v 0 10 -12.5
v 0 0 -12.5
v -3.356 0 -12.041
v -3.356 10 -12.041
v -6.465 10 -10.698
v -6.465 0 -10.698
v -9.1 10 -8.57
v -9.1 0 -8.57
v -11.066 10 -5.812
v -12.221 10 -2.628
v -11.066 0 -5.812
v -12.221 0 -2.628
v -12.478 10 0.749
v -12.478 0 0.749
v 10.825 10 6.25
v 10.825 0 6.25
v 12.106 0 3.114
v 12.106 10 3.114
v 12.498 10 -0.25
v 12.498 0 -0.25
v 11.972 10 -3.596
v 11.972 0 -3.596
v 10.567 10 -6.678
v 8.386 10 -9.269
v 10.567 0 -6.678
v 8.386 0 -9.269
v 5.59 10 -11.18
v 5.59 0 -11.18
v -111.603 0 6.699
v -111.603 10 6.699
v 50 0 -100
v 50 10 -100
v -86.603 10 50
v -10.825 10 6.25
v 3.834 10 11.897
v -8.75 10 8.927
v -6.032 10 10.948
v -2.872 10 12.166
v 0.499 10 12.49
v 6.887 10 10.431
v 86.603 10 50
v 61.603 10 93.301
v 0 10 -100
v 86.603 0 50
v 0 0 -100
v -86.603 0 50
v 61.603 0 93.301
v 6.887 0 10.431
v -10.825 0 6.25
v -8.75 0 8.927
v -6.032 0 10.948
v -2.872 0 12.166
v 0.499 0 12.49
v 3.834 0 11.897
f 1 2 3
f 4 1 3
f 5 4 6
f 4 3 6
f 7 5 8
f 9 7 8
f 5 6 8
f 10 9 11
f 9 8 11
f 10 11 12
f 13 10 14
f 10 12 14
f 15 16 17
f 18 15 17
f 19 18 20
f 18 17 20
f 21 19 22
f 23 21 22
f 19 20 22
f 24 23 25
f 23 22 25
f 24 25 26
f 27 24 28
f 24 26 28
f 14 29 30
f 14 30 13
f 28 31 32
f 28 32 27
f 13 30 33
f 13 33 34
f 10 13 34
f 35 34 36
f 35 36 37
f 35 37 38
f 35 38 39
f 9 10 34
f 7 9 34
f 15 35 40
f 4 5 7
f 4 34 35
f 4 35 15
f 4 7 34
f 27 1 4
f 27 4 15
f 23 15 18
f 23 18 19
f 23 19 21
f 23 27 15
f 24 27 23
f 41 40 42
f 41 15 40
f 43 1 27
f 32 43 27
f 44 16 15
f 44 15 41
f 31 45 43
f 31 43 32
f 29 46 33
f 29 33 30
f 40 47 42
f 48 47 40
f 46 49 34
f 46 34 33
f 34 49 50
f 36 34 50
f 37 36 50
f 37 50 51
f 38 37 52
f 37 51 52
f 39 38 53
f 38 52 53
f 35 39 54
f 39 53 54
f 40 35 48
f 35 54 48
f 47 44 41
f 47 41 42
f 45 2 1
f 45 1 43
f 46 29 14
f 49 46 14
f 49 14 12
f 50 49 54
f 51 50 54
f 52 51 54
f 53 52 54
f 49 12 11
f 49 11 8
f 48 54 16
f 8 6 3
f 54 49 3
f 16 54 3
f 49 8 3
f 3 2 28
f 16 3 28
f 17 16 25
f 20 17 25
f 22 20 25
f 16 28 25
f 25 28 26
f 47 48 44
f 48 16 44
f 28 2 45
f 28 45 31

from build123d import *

# Parameters (mm, degrees)
SKETCH1_R           = 12.5
BOSS_EXTRUDE1_DEPTH = 10


with BuildPart() as part:
    # Sketch1 → Boss-Extrude1 (new body)
    with BuildSketch(Plane(origin=(0, 0, 0), x_dir=(1, 0, 0), z_dir=(0, 1, 0))):
        Circle(SKETCH1_R)
        Polygon((50, 100), (0, 0), (0, 100), align=None)
        Polygon((-111.602540378, -6.698729811), (0, 0), (-86.602540378, -50), align=None)
        Polygon((61.602540378, -93.301270189), (0, 0), (86.602540378, -50), align=None)
        with BuildLine():
            Line((-12.477543337, -0.748940761), (0, 0))
            Line((0, 0), (0, 12.5))
            ThreePointArc((0, 12.5), (-9.09977361, 8.569954507), (-12.477543337, -0.748940761))
        make_face()
        with BuildLine():
            Line((0, 12.5), (0, 0))
            Line((0, 0), (5.590169944, 11.180339887))
            ThreePointArc((5.590169944, 11.180339887), (2.871911507, 12.165612368), (0, 12.5))
        make_face()
        with BuildLine():
            Line((5.590169944, 11.180339887), (0, 0))
            Line((0, 0), (10.825317547, -6.25))
            ThreePointArc((10.825317547, -6.25), (12.074072829, -3.235238064), (12.5, 0))
            ThreePointArc((12.5, 0), (10.633135104, 6.571638901), (5.590169944, 11.180339887))
        make_face()
        with BuildLine():
            Line((10.825317547, -6.25), (0, 0))
            Line((0, 0), (6.887373394, -10.431399127))
            ThreePointArc((6.887373394, -10.431399127), (9.09977361, -8.569954507), (10.825317547, -6.25))
        make_face()
        with BuildLine():
            Line((6.887373394, -10.431399127), (0, 0))
            Line((0, 0), (-10.825317547, -6.25))
            ThreePointArc((-10.825317547, -6.25), (-2.871911507, -12.165612368), (6.887373394, -10.431399127))
        make_face()
        with BuildLine():
            Line((-10.825317547, -6.25), (0, 0))
            Line((0, 0), (-12.477543337, -0.748940761))
            ThreePointArc((-12.477543337, -0.748940761), (-11.971685117, -3.595657862), (-10.825317547, -6.25))
        make_face()
    extrude(amount=BOSS_EXTRUDE1_DEPTH)


solid = part.part
